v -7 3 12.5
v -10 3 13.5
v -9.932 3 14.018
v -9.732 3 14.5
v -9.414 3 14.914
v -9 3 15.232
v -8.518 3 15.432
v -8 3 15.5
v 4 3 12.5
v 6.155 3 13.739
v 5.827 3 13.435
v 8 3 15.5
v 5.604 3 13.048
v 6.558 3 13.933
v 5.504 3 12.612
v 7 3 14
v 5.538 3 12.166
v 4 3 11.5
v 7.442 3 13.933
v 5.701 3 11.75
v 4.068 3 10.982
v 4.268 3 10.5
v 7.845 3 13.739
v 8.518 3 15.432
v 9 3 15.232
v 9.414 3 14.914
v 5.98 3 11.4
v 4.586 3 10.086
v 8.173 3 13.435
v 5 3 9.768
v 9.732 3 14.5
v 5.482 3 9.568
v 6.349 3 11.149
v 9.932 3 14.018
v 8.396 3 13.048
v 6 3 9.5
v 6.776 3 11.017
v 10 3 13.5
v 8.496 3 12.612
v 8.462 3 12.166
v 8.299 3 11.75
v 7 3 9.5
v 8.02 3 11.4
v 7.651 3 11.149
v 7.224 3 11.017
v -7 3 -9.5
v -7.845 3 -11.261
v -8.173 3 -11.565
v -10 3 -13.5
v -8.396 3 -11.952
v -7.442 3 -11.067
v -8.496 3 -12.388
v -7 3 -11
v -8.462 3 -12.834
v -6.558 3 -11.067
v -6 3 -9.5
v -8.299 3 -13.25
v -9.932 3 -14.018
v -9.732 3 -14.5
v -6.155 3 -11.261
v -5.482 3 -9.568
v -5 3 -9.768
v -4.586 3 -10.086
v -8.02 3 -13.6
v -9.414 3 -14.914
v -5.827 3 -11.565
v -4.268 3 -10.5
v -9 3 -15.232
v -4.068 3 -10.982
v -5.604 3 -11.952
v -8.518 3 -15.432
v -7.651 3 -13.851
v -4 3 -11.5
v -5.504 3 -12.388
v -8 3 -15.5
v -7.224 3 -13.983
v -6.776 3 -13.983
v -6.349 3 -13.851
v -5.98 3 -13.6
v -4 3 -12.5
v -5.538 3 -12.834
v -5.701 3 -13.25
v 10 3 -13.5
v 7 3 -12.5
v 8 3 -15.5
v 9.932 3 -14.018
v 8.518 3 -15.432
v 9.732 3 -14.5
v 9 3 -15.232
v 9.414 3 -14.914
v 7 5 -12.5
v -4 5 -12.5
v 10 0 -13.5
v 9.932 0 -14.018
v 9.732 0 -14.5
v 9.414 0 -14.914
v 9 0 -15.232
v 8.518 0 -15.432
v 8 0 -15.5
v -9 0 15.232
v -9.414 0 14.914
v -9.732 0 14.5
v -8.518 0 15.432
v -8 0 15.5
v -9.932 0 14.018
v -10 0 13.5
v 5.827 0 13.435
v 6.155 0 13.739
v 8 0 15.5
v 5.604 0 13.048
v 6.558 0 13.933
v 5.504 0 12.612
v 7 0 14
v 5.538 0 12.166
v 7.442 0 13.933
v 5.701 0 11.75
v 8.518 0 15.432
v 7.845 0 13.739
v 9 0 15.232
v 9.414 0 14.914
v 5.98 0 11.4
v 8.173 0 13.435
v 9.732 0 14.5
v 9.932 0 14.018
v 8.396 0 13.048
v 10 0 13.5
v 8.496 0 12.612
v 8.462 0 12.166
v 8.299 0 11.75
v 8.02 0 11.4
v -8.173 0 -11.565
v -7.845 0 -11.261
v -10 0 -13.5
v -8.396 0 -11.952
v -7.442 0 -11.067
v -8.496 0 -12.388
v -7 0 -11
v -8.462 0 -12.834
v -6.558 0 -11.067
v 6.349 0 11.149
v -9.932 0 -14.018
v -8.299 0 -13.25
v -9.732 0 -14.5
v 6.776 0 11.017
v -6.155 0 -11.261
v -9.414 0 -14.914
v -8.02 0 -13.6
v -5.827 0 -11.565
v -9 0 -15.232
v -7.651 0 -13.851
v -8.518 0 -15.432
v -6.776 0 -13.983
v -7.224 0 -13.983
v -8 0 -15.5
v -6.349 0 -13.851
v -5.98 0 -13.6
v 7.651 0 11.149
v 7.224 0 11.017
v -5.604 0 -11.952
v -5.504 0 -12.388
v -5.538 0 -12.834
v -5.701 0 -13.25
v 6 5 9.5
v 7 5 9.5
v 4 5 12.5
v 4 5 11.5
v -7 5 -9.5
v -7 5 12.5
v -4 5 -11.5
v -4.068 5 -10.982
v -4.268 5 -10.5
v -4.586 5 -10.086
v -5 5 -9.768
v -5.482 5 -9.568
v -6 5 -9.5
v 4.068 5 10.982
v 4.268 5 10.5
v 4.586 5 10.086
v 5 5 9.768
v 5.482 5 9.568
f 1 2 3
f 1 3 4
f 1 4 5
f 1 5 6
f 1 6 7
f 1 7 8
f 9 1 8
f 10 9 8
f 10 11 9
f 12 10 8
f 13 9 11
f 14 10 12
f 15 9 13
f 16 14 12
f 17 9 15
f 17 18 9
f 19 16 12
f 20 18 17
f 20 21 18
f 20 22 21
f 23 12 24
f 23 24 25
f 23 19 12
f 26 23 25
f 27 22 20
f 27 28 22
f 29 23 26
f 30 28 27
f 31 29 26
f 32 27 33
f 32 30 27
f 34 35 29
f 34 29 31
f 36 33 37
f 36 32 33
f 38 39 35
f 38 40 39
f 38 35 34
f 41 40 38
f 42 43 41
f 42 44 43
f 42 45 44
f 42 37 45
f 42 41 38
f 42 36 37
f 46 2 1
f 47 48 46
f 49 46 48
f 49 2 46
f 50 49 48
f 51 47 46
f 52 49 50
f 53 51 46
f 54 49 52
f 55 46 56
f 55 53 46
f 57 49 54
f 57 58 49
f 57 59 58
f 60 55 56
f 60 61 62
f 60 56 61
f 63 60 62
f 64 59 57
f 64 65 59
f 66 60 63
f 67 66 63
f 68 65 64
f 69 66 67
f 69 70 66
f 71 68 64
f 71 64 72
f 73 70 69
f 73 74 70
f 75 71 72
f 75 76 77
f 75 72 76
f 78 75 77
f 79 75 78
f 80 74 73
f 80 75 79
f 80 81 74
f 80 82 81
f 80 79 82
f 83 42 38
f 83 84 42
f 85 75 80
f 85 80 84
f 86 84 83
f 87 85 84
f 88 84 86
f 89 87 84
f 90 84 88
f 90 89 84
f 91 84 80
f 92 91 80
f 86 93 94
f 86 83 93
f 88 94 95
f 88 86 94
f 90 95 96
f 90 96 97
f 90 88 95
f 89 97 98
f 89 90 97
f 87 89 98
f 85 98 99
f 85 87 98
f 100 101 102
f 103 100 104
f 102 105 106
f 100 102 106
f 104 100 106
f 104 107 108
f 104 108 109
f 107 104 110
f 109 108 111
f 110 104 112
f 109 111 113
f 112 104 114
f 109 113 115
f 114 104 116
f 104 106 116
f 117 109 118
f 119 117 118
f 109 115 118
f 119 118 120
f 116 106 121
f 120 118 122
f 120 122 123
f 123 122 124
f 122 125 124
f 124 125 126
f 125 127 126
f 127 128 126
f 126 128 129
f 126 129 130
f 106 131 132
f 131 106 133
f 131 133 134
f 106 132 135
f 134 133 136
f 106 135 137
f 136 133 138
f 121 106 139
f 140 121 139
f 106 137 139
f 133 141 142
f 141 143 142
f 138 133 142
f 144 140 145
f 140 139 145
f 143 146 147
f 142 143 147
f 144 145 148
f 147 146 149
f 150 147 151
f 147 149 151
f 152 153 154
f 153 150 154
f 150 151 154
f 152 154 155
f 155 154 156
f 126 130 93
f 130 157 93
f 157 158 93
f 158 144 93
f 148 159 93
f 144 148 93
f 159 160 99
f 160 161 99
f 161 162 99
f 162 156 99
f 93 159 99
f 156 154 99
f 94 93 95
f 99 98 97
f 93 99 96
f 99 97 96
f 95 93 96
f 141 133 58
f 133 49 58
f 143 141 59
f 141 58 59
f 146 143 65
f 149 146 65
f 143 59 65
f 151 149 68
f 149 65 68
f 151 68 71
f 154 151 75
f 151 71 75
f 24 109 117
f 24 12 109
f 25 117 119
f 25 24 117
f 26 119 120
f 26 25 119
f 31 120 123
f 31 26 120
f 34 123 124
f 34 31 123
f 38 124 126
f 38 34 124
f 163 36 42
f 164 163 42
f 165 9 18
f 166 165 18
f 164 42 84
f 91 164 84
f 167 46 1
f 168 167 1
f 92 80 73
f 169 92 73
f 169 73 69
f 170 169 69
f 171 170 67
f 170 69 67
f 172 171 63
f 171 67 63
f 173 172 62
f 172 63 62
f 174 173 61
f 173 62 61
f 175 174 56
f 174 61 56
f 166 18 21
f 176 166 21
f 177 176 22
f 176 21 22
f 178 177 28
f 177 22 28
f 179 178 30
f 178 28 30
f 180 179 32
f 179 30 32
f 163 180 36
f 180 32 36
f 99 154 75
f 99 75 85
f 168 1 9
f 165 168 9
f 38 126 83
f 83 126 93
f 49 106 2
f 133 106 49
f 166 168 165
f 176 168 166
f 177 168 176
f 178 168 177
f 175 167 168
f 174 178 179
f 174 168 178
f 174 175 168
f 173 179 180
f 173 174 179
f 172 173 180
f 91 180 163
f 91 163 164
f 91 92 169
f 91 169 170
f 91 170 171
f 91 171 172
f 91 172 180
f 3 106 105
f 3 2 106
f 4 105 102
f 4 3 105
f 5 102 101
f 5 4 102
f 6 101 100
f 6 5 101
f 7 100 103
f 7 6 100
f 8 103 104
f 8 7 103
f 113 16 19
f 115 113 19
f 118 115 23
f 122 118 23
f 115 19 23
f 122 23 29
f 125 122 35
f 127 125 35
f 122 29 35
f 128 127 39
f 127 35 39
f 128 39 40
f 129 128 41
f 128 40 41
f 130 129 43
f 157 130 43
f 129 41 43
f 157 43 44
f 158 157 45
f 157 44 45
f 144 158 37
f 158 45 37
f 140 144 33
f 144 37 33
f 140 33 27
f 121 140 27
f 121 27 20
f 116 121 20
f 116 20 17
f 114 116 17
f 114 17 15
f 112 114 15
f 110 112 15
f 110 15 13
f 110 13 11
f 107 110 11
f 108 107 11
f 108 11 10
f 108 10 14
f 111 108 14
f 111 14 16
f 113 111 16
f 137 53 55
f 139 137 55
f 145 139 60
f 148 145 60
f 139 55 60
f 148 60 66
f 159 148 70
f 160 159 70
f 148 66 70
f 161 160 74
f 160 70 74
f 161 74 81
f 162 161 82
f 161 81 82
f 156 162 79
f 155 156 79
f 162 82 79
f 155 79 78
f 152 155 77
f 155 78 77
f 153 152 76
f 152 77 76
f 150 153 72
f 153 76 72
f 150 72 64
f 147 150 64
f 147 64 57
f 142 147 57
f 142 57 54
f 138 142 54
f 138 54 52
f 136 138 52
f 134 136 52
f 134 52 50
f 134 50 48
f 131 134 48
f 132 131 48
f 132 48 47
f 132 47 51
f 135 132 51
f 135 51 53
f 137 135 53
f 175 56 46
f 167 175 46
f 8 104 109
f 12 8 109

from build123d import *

# Parameters (mm, degrees)
CROQUIS1_W              = 20
CROQUIS1_H              = 31
SALIENTE_EXTRUIR1_DEPTH = 3
REDONDEO1_R             = 2
SALIENTE_EXTRUIR2_DEPTH = 2
CROQUIS3_R              = 1.5
CORTAR_EXTRUIR1_DEPTH   = 4


with BuildPart() as part:
    # Croquis1 → Saliente-Extruir1 (new body)
    with BuildSketch(Plane(origin=(0, 0, 0), x_dir=(1, 0, 0), z_dir=(0, 1, 0))):
        Rectangle(CROQUIS1_W, CROQUIS1_H)
    extrude(amount=SALIENTE_EXTRUIR1_DEPTH)

    # Redondeo1
    redondeo1_edges = [part.edges().sort_by_distance(p)[0] for p in [
        (10, 1.5, 15.5),
        (-10, 1.5, 15.5),
        (-10, 1.5, -15.5),
        (10, 1.5, -15.5),
    ]]
    fillet(redondeo1_edges, radius=REDONDEO1_R)

    # Croquis2 → Saliente-Extruir2 (add)
    with BuildSketch(Plane(origin=(0, 3, 0), x_dir=(1, 0, 0), z_dir=(0, 1, 0))):
        with BuildLine():
            Line((-7, -12.5), (4, -12.5))
            Line((4, -12.5), (4, -11.5))
            ThreePointArc((4, -11.5), (4.585786438, -10.085786438), (6, -9.5))
            Line((6, -9.5), (7, -9.5))
            Line((7, -9.5), (7, 12.5))
            Line((7, 12.5), (-4, 12.5))
            Line((-4, 12.5), (-4, 11.5))
            ThreePointArc((-4, 11.5), (-4.585786438, 10.085786438), (-6, 9.5))
            Line((-6, 9.5), (-7, 9.5))
            Line((-7, 9.5), (-7, -12.5))
        make_face()
    extrude(amount=SALIENTE_EXTRUIR2_DEPTH)

    # Croquis3 → Cortar-Extruir1 (cut)
    with BuildSketch(Plane(origin=(0, 3, 0), x_dir=(1, 0, 0), z_dir=(0, 1, 0))):
        with Locations(Location((-7, 12.5, 0), (0, 0, 270))):
            Circle(CROQUIS3_R)
        with Locations(Location((7, -12.5, 0), (0, 0, 270))):
            Circle(CROQUIS3_R)
    extrude(amount=-CORTAR_EXTRUIR1_DEPTH, mode=Mode.SUBTRACT)


solid = part.part
